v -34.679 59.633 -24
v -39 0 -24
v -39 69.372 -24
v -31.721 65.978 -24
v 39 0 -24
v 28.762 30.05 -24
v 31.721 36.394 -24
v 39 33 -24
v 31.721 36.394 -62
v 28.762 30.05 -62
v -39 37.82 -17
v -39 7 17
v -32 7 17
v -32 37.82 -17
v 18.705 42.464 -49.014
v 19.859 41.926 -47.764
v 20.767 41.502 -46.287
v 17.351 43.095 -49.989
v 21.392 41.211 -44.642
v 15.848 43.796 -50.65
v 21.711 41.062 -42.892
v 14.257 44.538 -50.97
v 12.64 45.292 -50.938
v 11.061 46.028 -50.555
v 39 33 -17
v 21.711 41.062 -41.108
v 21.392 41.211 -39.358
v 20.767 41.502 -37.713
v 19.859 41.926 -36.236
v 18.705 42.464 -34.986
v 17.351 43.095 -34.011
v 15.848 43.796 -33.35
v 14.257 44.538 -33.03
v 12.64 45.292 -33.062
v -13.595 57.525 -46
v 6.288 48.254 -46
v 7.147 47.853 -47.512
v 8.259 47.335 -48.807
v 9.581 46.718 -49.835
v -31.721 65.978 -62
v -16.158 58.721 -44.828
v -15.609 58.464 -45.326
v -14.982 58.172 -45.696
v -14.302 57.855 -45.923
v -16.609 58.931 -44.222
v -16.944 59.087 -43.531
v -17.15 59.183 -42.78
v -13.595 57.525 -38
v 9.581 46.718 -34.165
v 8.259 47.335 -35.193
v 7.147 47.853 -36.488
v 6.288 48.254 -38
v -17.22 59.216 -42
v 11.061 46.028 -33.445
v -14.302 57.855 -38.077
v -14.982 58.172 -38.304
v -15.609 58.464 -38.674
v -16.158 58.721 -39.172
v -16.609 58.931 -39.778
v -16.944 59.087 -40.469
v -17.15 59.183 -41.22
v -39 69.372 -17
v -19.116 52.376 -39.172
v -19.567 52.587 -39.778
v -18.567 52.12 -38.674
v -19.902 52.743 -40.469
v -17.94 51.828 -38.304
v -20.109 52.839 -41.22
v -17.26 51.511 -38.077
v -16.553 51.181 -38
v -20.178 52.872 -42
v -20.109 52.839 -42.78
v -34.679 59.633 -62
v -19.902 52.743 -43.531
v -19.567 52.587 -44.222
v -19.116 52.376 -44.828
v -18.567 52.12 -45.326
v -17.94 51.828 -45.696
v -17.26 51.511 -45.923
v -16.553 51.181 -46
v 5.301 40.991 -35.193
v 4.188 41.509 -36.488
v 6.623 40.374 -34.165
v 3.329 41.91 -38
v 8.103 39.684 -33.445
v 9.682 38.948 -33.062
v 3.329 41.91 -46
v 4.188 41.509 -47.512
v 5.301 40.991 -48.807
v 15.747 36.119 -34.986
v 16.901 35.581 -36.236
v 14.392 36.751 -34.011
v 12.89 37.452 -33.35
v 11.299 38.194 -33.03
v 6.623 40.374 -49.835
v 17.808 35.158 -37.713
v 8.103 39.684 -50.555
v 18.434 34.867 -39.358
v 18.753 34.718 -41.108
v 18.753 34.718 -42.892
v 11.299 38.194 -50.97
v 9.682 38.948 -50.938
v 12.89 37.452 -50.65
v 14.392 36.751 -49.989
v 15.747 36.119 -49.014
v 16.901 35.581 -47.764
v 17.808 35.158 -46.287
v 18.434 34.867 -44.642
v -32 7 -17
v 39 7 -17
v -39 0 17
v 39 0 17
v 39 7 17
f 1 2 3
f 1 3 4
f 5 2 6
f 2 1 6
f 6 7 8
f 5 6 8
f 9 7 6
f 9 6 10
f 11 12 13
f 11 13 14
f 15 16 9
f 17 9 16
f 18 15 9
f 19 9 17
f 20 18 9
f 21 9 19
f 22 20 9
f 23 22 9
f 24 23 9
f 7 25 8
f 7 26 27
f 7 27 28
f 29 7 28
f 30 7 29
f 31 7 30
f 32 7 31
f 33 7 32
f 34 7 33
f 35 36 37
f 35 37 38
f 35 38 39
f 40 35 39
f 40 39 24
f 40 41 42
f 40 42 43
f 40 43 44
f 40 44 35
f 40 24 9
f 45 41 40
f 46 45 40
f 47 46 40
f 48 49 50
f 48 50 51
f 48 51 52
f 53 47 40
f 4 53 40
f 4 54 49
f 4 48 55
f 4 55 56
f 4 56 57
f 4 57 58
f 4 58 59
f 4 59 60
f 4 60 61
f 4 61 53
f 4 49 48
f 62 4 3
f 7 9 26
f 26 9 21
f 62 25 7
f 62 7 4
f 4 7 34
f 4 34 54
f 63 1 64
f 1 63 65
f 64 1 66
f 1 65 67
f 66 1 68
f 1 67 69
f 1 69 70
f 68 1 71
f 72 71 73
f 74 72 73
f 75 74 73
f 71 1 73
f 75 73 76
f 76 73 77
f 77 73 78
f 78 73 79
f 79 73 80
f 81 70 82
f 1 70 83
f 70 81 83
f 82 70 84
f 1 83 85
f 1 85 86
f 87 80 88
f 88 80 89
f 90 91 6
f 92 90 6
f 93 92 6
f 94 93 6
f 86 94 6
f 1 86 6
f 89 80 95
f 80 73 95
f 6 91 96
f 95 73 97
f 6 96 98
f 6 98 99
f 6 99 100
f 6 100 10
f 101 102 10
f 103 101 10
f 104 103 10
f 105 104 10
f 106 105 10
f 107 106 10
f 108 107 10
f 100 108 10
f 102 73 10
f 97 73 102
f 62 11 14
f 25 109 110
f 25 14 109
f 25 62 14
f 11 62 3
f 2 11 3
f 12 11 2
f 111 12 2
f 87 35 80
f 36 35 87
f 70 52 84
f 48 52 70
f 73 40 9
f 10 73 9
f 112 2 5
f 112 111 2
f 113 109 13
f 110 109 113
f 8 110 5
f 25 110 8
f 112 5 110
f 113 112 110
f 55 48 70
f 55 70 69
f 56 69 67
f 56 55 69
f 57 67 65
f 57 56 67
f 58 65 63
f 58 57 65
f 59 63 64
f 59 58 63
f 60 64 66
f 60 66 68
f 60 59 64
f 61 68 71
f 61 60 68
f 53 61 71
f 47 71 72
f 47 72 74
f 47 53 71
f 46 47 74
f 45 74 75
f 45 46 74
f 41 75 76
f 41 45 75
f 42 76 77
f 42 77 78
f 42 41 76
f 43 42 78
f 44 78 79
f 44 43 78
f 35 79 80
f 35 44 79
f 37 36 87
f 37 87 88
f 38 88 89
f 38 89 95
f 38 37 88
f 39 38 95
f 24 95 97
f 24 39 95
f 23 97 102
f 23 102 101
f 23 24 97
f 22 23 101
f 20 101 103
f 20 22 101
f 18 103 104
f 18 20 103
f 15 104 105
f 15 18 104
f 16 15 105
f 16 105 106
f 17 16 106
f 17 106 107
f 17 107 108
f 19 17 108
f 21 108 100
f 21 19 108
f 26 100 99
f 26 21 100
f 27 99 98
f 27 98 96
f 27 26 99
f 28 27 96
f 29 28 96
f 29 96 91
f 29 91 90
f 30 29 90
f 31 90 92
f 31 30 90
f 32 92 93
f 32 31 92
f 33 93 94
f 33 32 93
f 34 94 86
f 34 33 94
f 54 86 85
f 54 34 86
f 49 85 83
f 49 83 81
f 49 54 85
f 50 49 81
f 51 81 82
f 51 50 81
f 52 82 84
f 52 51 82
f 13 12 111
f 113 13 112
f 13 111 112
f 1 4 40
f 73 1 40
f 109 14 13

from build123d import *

# Parameters (mm, degrees)
SKETCH1_W           = 78
SKETCH1_H           = 34
BOSS_EXTRUDE1_DEPTH = 7
BOSS_EXTRUDE2_DEPTH = 7
BOSS_EXTRUDE3_DEPTH = 7
SKETCH6_W           = 70
SKETCH6_H           = 38
BOSS_EXTRUDE4_DEPTH = 7
CUT_EXTRUDE1_DEPTH  = 7


with BuildPart() as part:
    # Sketch1 → Boss-Extrude1 (new body)
    with BuildSketch(Plane(origin=(0, 0, 0), x_dir=(1, 0, 0), z_dir=(0, 1, 0))):
        Rectangle(SKETCH1_W, SKETCH1_H)
    extrude(amount=BOSS_EXTRUDE1_DEPTH)

    # Sketch3 → Boss-Extrude2 (add)
    with BuildSketch(Plane.ZY.offset(39)):
        Polygon((17, 7), (-17, 37.819553073), (-17, 7), align=None)
    extrude(amount=-BOSS_EXTRUDE2_DEPTH)

    # Sketch4 → Boss-Extrude3 (add)
    with BuildSketch(Plane(origin=(0, 0, -17), x_dir=(-1, 0, 0), z_dir=(0, 0, -1))):
        Polygon((-39, 0), (-39, 33), (39, 69.371997336), (39, 0), align=None)
    extrude(amount=BOSS_EXTRUDE3_DEPTH)

    # Sketch6 → Boss-Extrude4 (add)
    with BuildSketch(Plane(origin=(19.605374923, 42.043862201, 0), x_dir=(0.9063077870366493, -0.4226182617407009, 0), z_dir=(0.4226182617407009, 0.9063077870366493, 0))):
        with Locations((-21.632137783, 43)):
            Rectangle(SKETCH6_W, SKETCH6_H)
    extrude(amount=-BOSS_EXTRUDE4_DEPTH)

    # Sketch7 → Cut-Extrude1 (cut)
    with BuildSketch(Plane(origin=(19.605374923, 42.043862201, 0), x_dir=(0.9063077870366493, -0.4226182617407009, 0), z_dir=(0.4226182617407009, 0.9063077870366493, 0))):
        with BuildLine():
            Line((-14.694395531, 38), (-36.632137783, 38))
            ThreePointArc((-36.632137783, 38), (-40.632137783, 42), (-36.632137783, 46))
            Line((-36.632137783, 46), (-14.694395531, 46))
            ThreePointArc((-14.694395531, 46), (2.367862217, 42), (-14.694395531, 38))
        make_face()
    extrude(amount=-CUT_EXTRUDE1_DEPTH, mode=Mode.SUBTRACT)


solid = part.part
